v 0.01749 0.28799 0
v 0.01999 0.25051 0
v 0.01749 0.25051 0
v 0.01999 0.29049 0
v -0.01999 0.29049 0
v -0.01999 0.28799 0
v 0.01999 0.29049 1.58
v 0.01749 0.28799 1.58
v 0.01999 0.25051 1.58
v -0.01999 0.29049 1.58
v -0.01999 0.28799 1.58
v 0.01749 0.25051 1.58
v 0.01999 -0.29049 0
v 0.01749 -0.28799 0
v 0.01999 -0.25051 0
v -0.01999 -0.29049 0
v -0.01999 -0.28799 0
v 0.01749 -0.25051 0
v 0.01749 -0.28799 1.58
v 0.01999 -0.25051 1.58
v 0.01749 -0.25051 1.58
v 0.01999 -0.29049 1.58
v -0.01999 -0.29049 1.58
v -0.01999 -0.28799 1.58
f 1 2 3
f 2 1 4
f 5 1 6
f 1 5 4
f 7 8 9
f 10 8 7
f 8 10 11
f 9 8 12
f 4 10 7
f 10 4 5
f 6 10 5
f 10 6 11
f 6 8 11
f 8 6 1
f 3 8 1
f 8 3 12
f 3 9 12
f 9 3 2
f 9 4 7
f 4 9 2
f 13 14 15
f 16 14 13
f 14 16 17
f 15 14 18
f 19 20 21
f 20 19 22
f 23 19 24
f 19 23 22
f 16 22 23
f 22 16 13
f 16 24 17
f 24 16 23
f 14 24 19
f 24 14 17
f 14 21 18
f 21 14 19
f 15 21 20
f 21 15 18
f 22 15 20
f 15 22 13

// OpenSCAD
//RMI - Uccle - Dimensions

//Legs
LprofilW = 0.04;
LprofilL = 0.04;
LprofilH = 1.580;
LprofilT = 0.005;
LDist = 0.541;

leg_pts = [
    [-LprofilW/2, LprofilL/2], [LprofilW/2, LprofilL/2],
    [-LprofilW/2, (LprofilL-LprofilT)/2], [(LprofilW-LprofilT)/2, (LprofilL-LprofilT)/2],
    [LprofilW/2, -LprofilL/2], [(LprofilW-LprofilT)/2, -LprofilL/2],
    ];
leg_pths = [[0,1,4,5,3,2]];


module Legs(leg_pts, leg_pths, extrude_height) {
    linear_extrude(height = extrude_height)polygon(points = leg_pts, paths = leg_pths);
}

module Mirror_Legs(leg_pts, leg_pths, extrude_height, distance){
    translate([0,distance/2,0])Legs(leg_pts, leg_pths, extrude_height);
    translate([0,-distance/2,0])mirror([0,1,0])Legs(leg_pts, leg_pths, extrude_height);
}

Mirror_Legs(leg_pts,leg_pths,LprofilH,LDist);
